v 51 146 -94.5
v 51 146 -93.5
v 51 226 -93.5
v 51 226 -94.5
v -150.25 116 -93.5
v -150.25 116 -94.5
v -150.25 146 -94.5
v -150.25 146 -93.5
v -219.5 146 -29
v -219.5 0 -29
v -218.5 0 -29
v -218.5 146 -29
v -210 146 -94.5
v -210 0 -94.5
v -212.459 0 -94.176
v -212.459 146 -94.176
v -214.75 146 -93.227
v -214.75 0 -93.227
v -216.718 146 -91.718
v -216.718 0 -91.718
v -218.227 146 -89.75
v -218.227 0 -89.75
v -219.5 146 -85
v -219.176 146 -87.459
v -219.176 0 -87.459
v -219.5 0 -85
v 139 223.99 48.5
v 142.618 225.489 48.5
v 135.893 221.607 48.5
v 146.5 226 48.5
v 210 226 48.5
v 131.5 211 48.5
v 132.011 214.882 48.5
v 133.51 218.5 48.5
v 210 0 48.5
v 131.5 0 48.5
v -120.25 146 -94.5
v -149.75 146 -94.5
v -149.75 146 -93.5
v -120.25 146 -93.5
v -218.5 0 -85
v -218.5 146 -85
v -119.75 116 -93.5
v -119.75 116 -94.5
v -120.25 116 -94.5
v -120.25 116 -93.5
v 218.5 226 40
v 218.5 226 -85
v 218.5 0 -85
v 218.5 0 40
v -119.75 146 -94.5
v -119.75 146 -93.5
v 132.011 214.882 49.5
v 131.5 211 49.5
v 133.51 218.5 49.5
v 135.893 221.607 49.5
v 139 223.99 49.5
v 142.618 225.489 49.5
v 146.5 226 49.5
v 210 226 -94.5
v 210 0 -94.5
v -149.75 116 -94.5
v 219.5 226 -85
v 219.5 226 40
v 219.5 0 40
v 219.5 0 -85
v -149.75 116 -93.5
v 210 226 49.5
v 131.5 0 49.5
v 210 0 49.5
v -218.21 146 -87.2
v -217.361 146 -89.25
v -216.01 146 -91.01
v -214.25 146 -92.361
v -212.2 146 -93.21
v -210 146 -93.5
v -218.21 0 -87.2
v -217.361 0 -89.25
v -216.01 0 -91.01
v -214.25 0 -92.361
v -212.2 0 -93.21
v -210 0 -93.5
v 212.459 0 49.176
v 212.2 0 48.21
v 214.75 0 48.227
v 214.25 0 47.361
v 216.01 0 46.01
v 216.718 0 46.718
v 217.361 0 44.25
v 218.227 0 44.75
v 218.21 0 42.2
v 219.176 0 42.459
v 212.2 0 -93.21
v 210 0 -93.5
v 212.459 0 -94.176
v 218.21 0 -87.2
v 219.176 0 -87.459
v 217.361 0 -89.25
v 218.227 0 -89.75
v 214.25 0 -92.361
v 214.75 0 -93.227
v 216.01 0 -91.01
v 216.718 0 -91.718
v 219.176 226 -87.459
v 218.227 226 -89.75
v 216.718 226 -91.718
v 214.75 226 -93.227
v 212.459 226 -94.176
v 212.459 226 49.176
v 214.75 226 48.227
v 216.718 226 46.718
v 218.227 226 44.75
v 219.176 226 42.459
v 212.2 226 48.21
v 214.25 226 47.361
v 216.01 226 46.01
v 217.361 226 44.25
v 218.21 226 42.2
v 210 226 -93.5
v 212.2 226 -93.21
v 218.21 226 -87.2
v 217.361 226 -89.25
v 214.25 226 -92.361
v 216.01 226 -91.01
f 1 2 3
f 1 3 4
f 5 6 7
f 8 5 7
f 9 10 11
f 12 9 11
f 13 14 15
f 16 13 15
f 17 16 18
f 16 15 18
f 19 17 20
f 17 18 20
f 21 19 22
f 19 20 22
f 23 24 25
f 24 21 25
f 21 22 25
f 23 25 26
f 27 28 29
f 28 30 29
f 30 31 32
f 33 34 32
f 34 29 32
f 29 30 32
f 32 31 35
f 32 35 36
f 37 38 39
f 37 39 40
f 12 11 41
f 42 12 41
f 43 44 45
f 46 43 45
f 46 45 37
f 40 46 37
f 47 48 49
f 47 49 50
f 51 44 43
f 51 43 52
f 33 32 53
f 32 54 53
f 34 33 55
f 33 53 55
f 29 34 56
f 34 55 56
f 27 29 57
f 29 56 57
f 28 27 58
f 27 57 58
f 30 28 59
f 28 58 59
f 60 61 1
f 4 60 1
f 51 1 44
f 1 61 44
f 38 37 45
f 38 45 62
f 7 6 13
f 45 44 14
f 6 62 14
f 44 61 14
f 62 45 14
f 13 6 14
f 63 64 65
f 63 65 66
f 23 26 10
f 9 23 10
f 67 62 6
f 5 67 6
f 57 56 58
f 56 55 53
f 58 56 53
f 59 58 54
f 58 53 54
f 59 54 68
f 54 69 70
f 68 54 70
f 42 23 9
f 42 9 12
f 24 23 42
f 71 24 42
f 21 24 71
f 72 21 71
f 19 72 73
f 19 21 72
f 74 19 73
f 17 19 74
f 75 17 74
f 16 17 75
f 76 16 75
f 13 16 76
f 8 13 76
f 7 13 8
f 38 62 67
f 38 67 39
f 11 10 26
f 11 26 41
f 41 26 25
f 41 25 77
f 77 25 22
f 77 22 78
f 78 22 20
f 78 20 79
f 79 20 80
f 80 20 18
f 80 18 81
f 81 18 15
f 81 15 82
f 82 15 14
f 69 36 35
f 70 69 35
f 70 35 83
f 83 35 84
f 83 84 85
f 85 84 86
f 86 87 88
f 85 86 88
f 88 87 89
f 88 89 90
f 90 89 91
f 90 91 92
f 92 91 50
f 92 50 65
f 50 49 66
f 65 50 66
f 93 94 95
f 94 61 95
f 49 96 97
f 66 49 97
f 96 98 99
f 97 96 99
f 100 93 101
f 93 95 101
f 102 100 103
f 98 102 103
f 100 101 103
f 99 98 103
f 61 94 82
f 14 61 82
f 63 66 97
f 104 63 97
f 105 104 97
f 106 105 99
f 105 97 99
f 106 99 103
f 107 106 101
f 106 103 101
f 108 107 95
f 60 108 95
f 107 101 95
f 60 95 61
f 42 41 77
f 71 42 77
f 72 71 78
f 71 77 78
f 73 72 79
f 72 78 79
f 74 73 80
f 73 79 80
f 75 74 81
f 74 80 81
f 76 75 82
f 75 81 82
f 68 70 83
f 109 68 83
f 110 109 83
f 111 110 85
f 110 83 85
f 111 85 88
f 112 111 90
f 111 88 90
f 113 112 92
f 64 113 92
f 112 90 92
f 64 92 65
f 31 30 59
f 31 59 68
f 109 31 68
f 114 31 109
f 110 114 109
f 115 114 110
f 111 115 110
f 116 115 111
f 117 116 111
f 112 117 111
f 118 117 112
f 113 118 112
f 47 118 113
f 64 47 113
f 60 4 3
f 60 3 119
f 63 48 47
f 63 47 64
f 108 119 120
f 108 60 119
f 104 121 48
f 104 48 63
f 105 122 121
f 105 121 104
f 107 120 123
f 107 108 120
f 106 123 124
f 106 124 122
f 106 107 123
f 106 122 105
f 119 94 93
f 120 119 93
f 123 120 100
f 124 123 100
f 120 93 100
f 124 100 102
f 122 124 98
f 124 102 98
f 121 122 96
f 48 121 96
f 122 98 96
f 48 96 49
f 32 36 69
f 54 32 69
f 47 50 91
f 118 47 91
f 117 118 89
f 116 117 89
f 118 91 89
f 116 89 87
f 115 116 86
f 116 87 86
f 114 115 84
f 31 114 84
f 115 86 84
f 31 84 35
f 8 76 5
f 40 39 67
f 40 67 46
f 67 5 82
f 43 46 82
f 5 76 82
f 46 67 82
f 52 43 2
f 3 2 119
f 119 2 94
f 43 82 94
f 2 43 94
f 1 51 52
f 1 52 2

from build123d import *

# Parameters (mm, degrees)
T_LE_DE_BASE_PLI_E1_DEPTH = 226
CONG_1_R                  = 15
ESQUISSE2_W               = 270.5
ESQUISSE2_H               = 65.5
ENL_V_MAT_EXTRU_1_DEPTH   = 80
ESQUISSE6_W               = 0.5
ESQUISSE6_H               = 30
ENL_V_MAT_EXTRU_2_DEPTH   = 10


# Read off the part's stored shape, not the designer's step: Tôle de base pliée1
with BuildPart() as part:
    # Tôle de base pliée1 outline → Tôle de base pliée1 (new body)
    with BuildSketch(Plane(origin=(0, 0, 0), x_dir=(1, 0, 0), z_dir=(0, 1, 0))):
        with BuildLine():
            Line((-219.5, 85), (-219.5, 29))
            Line((-219.5, 29), (-218.5, 29))
            Line((-218.5, 29), (-218.5, 85))
            ThreePointArc((-218.5, 85), (-216.01040764, 91.01040764), (-210, 93.5))
            Line((-210, 93.5), (210, 93.5))
            ThreePointArc((210, 93.5), (216.01040764, 91.01040764), (218.5, 85))
            Line((218.5, 85), (218.5, -40))
            ThreePointArc((218.5, -40), (216.01040764, -46.01040764), (210, -48.5))
            Line((210, -48.5), (131.5, -48.5))
            Line((131.5, -48.5), (131.5, -49.5))
            Line((131.5, -49.5), (210, -49.5))
            ThreePointArc((210, -49.5), (216.717514421, -46.717514421), (219.5, -40))
            Line((219.5, -40), (219.5, 85))
            ThreePointArc((219.5, 85), (216.717514421, 91.717514421), (210, 94.5))
            Line((210, 94.5), (-210, 94.5))
            ThreePointArc((-210, 94.5), (-216.717514421, 91.717514421), (-219.5, 85))
        make_face()
    extrude(amount=T_LE_DE_BASE_PLI_E1_DEPTH)

    # Congé1
    cong_1_edges = [part.edges().sort_by_distance(p)[0] for p in [
        (131.5, 226, 49),
    ]]
    fillet(cong_1_edges, radius=CONG_1_R)

    # Esquisse2 → Enlèv. mat.-Extru.1 (cut)
    with BuildSketch(Plane(origin=(0, 226, 0), x_dir=(1, 0, 0), z_dir=(0, 1, 0))):
        with Locations((-84.25, 61.75)):
            Rectangle(ESQUISSE2_W, ESQUISSE2_H)
    extrude(amount=-ENL_V_MAT_EXTRU_1_DEPTH, mode=Mode.SUBTRACT)

    # Esquisse6 → Enlèv. mat.-Extru.2 (cut)
    with BuildSketch(Plane(origin=(0, 0, -94.5), x_dir=(-1, 0, 0), z_dir=(0, 0, -1))):
        with Locations((120, 131)):
            Rectangle(ESQUISSE6_W, ESQUISSE6_H)
        with Locations((150, 131)):
            Rectangle(ESQUISSE6_W, ESQUISSE6_H)
    extrude(amount=-ENL_V_MAT_EXTRU_2_DEPTH, mode=Mode.SUBTRACT)


solid = part.part
